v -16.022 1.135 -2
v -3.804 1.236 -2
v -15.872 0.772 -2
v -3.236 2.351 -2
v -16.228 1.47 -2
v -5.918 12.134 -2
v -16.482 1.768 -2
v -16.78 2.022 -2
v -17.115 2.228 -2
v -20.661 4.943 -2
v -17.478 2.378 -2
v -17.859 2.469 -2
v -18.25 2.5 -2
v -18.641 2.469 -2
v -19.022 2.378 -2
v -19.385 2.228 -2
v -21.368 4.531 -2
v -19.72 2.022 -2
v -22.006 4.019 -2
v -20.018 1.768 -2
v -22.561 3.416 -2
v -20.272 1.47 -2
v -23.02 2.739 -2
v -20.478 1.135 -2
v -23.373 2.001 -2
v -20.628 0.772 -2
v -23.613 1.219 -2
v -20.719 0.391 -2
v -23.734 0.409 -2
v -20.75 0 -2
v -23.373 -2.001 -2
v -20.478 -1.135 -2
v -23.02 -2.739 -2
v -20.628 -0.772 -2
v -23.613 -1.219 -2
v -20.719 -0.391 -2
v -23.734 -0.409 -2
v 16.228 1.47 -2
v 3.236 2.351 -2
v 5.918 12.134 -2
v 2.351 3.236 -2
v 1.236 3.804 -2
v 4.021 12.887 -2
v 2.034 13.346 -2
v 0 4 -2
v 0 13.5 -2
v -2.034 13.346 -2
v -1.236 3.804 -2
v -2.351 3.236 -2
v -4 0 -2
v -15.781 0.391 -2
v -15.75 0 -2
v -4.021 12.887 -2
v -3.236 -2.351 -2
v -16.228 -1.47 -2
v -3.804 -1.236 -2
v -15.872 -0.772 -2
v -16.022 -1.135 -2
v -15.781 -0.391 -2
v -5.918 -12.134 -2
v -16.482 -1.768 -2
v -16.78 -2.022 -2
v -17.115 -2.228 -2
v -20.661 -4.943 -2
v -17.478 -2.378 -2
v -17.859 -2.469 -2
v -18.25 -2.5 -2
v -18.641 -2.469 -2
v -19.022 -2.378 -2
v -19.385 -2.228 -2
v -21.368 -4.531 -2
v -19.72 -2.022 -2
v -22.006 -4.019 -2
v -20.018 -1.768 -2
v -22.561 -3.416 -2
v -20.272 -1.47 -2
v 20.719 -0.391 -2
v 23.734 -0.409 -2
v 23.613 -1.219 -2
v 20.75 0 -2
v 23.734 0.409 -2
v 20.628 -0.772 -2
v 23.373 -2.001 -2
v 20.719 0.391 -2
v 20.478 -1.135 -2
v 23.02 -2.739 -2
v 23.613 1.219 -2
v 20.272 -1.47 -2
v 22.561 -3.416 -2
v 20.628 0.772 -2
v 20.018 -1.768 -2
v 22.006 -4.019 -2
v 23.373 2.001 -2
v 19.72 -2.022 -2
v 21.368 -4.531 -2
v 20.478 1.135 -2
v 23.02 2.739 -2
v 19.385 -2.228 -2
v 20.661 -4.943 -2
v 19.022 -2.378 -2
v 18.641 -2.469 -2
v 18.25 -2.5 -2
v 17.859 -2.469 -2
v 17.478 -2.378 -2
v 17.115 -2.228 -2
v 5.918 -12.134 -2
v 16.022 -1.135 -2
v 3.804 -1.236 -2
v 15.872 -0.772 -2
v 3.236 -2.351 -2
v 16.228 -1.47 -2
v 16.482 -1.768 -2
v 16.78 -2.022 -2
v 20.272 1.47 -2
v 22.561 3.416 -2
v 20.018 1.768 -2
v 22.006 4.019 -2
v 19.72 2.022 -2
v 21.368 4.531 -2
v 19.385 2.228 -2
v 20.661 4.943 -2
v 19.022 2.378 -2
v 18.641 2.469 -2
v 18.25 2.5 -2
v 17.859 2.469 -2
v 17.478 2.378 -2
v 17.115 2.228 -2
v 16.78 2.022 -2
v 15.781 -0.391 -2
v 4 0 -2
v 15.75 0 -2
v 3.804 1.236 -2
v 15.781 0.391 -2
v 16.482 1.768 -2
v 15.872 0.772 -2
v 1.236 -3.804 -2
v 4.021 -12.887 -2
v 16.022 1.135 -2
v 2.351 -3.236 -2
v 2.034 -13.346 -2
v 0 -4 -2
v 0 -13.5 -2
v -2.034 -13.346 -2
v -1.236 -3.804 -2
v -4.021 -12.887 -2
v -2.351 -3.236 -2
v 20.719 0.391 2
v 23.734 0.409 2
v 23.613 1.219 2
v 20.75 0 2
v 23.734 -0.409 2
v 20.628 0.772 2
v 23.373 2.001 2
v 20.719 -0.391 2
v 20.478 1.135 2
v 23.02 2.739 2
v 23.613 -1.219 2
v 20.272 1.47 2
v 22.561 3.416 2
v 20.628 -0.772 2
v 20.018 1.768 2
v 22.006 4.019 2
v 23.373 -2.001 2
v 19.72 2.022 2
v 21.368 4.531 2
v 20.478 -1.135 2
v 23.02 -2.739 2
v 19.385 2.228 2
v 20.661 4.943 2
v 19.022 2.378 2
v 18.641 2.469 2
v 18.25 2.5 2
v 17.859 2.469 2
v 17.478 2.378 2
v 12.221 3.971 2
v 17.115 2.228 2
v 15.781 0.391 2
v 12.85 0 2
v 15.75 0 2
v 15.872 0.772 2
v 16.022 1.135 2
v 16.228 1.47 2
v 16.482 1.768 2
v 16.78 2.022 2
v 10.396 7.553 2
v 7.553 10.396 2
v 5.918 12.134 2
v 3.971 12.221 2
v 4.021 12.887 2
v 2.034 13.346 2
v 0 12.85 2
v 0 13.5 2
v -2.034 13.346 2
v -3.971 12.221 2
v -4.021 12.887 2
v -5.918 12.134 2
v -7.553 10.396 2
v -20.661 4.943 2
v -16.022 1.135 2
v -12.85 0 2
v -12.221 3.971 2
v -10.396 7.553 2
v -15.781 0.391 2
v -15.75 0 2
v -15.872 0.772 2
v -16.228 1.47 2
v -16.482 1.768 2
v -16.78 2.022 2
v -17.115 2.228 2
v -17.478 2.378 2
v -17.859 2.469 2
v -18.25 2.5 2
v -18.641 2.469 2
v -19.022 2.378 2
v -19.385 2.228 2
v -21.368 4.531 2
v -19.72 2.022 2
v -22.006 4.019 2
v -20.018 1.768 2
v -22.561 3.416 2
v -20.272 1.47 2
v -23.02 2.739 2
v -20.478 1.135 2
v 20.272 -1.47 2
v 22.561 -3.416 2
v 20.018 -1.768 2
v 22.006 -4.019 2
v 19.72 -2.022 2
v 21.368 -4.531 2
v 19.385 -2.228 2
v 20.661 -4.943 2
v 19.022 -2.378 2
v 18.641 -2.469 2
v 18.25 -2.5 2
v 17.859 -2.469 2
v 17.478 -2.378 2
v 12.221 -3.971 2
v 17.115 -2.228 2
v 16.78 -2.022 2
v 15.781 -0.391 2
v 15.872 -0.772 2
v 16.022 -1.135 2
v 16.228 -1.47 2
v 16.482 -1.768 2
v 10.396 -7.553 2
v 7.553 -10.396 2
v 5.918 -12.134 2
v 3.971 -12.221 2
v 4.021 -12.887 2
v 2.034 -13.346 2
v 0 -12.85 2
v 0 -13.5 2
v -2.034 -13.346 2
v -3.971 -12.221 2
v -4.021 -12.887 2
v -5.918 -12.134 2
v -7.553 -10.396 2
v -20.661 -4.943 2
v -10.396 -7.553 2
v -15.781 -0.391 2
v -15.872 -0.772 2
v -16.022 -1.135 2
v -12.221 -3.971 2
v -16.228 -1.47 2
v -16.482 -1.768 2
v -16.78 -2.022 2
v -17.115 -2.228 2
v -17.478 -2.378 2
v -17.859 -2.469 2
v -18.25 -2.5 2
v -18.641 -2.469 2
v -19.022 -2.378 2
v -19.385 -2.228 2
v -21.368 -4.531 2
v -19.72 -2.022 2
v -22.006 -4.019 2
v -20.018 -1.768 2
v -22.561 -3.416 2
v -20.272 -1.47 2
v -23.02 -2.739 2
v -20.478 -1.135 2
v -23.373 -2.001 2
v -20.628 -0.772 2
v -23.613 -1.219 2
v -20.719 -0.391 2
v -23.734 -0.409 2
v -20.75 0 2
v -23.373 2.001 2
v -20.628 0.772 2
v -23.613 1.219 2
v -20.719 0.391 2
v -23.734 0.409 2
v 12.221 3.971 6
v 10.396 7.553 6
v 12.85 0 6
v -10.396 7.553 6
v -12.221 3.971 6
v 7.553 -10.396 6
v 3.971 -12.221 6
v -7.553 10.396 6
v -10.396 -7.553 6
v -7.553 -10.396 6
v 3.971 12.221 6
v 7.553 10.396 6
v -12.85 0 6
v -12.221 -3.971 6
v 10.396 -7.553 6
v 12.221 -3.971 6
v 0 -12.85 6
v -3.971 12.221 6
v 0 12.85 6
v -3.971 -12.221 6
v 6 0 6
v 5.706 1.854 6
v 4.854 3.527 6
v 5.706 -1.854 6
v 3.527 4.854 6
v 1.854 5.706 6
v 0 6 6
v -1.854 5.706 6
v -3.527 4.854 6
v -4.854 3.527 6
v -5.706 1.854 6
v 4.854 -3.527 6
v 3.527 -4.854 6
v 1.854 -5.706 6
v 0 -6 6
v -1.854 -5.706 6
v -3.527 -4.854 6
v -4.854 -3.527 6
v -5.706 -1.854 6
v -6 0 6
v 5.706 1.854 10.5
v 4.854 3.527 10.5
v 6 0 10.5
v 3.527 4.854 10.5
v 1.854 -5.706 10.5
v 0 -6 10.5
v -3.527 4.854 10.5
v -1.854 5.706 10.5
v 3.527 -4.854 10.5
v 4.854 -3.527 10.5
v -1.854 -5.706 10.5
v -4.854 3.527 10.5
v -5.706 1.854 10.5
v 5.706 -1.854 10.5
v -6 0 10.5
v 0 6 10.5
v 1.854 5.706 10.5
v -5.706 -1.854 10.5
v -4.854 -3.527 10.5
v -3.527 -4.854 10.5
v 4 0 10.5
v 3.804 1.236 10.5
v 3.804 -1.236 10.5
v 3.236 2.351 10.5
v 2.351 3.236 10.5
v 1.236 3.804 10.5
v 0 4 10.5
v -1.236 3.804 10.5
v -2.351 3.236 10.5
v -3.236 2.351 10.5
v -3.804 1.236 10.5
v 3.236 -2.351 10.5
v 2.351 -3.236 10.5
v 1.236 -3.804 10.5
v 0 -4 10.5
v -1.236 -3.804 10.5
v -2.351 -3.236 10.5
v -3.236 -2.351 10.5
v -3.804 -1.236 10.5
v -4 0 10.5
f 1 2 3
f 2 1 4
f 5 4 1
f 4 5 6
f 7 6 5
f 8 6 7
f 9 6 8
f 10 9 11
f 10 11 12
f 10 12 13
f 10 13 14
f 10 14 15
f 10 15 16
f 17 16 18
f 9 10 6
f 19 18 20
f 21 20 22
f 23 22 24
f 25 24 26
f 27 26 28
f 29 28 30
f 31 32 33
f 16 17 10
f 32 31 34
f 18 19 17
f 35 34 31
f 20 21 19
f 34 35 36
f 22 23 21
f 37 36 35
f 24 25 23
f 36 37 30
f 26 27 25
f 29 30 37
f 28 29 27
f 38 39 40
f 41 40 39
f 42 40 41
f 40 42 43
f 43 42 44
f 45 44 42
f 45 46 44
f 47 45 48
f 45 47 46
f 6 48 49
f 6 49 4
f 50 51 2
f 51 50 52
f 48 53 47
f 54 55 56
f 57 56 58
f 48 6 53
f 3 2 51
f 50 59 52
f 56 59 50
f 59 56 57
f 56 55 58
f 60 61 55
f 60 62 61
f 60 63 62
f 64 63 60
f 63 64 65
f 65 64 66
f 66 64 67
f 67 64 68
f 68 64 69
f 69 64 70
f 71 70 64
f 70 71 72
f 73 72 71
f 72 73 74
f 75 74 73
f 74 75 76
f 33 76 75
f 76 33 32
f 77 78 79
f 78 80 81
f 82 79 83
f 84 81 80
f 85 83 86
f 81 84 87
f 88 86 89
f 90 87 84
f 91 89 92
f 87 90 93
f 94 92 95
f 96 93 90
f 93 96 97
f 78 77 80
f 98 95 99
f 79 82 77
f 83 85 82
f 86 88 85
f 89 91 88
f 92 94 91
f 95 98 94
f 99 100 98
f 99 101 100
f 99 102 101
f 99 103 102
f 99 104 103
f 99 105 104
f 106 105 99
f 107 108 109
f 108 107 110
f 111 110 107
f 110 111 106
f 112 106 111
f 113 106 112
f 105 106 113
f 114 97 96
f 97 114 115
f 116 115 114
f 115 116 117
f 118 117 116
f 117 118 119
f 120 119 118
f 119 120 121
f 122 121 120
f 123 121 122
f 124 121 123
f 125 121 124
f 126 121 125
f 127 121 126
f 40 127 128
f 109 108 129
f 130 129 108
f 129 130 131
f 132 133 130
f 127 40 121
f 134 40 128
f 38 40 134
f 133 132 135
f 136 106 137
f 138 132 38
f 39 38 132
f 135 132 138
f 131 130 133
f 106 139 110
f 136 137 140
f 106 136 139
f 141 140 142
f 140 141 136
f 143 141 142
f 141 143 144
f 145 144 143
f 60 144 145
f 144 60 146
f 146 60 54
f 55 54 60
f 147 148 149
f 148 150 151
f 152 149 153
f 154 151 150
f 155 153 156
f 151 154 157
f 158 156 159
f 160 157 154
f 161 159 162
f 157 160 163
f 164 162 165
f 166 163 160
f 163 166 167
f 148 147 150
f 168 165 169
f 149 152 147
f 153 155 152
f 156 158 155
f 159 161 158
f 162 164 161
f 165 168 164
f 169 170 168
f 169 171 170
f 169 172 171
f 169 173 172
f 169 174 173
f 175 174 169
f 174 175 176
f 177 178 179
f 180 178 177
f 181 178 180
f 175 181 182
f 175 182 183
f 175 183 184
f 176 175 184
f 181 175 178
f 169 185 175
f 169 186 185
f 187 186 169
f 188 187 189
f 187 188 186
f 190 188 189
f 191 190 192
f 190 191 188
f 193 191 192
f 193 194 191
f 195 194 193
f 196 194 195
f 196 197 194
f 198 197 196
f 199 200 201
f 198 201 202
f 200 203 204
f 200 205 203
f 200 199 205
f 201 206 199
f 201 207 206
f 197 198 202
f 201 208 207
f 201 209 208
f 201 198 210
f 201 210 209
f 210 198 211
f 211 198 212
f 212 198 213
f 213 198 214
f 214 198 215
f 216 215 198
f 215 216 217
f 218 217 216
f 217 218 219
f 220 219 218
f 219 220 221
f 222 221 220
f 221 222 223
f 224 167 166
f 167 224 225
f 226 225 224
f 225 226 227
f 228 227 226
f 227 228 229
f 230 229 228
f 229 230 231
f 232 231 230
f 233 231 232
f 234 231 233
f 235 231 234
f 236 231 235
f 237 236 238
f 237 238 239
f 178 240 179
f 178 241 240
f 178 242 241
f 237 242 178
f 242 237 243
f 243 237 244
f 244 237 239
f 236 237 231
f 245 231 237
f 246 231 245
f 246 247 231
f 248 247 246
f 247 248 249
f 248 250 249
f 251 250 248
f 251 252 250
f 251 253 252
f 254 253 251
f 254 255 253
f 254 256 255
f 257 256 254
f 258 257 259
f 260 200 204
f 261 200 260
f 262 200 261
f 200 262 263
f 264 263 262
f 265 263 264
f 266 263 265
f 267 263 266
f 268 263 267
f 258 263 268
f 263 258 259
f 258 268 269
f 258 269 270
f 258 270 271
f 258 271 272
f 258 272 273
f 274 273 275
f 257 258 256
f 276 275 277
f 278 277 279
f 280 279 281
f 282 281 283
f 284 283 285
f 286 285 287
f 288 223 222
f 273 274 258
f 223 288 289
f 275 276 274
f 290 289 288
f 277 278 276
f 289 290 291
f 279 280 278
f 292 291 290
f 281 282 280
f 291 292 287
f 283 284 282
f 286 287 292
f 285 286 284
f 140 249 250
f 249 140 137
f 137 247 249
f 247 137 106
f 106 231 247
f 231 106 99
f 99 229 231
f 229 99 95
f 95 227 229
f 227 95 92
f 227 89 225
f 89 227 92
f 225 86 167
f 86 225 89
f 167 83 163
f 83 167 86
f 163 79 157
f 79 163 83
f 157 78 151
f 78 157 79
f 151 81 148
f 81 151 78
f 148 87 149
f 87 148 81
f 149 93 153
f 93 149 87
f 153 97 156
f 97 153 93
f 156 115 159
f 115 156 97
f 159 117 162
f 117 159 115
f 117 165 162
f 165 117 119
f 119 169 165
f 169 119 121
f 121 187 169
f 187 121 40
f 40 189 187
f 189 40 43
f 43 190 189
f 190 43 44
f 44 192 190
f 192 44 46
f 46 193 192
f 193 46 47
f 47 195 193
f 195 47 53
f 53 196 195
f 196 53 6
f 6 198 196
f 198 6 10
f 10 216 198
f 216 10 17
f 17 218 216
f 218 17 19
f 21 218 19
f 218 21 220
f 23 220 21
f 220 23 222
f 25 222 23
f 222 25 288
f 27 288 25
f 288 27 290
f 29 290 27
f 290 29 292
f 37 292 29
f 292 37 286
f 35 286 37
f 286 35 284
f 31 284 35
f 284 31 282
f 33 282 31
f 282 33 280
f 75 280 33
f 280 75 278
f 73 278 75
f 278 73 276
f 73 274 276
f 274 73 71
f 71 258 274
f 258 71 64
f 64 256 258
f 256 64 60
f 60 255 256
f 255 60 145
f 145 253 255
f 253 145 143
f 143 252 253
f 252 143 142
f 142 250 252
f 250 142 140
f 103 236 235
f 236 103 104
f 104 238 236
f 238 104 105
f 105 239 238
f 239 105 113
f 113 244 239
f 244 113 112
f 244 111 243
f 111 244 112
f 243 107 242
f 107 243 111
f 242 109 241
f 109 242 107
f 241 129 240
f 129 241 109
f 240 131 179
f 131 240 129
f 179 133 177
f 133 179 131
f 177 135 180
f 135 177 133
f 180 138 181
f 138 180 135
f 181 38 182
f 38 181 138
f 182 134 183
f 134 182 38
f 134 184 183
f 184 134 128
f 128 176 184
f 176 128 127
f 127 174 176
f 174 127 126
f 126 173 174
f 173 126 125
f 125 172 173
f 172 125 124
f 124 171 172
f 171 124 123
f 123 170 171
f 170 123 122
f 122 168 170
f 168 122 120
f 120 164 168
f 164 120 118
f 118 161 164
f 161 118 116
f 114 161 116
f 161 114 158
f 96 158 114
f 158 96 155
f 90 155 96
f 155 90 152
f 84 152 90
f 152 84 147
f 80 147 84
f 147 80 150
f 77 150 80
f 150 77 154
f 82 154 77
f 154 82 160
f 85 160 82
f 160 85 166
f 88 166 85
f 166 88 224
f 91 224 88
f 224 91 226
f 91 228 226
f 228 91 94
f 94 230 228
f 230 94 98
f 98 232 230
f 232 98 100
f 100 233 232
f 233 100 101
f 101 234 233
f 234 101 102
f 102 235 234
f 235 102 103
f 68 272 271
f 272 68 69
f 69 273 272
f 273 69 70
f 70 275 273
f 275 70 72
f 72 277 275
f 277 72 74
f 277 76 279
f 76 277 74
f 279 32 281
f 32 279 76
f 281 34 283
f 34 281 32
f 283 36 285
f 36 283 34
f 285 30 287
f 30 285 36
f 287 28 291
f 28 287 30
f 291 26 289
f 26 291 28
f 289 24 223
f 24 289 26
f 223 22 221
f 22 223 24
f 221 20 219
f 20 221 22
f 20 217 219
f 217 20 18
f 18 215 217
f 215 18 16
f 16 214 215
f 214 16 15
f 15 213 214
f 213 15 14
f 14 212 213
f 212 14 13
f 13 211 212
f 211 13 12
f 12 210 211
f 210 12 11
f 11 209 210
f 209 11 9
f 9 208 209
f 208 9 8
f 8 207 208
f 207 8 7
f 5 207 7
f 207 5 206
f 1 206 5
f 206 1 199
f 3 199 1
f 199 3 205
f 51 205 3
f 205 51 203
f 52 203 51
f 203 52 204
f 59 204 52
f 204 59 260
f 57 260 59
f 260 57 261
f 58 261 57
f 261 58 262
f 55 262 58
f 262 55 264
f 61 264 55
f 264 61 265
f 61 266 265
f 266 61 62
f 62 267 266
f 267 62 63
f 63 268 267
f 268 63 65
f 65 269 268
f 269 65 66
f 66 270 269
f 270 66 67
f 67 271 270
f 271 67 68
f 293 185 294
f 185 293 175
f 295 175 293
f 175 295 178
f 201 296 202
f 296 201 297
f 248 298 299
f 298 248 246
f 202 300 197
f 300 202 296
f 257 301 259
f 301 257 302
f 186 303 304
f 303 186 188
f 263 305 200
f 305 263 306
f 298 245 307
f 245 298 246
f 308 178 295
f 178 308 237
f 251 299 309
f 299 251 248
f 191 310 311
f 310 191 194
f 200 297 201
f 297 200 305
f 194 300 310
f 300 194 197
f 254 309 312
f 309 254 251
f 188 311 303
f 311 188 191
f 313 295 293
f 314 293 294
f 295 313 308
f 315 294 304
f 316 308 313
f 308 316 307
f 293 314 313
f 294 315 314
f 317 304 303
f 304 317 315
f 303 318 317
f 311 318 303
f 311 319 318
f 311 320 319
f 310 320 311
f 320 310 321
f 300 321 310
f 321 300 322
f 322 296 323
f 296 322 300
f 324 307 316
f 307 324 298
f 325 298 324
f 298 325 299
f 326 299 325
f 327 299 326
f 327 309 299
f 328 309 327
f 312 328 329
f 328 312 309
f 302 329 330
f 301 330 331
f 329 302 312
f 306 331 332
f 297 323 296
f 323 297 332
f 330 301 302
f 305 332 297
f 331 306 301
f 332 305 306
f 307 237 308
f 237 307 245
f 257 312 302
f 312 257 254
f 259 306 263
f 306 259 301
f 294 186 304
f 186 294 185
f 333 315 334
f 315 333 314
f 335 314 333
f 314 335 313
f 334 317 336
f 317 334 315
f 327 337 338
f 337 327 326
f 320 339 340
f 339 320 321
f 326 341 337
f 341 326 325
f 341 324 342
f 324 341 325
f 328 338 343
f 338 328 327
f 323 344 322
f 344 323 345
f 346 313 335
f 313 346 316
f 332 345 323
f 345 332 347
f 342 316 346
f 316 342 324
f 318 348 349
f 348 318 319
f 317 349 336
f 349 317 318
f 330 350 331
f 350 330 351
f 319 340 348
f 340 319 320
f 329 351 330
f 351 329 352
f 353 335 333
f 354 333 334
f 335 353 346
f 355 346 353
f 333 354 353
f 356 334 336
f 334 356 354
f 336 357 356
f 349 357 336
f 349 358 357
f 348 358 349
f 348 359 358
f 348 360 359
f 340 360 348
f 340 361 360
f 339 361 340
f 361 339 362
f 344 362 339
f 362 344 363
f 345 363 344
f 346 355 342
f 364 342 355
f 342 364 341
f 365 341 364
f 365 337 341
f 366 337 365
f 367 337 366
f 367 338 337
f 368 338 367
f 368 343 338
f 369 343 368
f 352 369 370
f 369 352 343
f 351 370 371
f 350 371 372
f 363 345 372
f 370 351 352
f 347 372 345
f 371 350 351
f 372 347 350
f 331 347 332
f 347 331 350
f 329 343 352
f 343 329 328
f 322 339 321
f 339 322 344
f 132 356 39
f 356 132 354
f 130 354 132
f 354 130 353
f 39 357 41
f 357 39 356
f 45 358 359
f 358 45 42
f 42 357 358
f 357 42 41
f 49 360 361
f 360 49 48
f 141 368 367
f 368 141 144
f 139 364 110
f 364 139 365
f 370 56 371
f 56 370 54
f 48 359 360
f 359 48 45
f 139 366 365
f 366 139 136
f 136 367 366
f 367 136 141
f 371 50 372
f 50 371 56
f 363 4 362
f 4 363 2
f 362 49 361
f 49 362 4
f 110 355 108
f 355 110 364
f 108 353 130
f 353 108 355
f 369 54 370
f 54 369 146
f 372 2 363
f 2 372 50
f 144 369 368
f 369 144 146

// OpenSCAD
module fl08(){
    difference(){
        color([0.7,0.7,0.7])union(){
            linear_extrude(height = 4, center = true, convexity = 10, $fn=40)
                import (file = "fl08.dxf", layer = "0");
            translate([0,0,2])cylinder(h=8, r=25.7/2, center=true, $fn=20);    
            translate([0,0,4.25])cylinder(h=12.5, r=6, center=true, $fn=20);    
        }
        translate([0,0,2])cylinder(h=20, r=4, center=true, $fn=20);    
    }
}

fl08();
